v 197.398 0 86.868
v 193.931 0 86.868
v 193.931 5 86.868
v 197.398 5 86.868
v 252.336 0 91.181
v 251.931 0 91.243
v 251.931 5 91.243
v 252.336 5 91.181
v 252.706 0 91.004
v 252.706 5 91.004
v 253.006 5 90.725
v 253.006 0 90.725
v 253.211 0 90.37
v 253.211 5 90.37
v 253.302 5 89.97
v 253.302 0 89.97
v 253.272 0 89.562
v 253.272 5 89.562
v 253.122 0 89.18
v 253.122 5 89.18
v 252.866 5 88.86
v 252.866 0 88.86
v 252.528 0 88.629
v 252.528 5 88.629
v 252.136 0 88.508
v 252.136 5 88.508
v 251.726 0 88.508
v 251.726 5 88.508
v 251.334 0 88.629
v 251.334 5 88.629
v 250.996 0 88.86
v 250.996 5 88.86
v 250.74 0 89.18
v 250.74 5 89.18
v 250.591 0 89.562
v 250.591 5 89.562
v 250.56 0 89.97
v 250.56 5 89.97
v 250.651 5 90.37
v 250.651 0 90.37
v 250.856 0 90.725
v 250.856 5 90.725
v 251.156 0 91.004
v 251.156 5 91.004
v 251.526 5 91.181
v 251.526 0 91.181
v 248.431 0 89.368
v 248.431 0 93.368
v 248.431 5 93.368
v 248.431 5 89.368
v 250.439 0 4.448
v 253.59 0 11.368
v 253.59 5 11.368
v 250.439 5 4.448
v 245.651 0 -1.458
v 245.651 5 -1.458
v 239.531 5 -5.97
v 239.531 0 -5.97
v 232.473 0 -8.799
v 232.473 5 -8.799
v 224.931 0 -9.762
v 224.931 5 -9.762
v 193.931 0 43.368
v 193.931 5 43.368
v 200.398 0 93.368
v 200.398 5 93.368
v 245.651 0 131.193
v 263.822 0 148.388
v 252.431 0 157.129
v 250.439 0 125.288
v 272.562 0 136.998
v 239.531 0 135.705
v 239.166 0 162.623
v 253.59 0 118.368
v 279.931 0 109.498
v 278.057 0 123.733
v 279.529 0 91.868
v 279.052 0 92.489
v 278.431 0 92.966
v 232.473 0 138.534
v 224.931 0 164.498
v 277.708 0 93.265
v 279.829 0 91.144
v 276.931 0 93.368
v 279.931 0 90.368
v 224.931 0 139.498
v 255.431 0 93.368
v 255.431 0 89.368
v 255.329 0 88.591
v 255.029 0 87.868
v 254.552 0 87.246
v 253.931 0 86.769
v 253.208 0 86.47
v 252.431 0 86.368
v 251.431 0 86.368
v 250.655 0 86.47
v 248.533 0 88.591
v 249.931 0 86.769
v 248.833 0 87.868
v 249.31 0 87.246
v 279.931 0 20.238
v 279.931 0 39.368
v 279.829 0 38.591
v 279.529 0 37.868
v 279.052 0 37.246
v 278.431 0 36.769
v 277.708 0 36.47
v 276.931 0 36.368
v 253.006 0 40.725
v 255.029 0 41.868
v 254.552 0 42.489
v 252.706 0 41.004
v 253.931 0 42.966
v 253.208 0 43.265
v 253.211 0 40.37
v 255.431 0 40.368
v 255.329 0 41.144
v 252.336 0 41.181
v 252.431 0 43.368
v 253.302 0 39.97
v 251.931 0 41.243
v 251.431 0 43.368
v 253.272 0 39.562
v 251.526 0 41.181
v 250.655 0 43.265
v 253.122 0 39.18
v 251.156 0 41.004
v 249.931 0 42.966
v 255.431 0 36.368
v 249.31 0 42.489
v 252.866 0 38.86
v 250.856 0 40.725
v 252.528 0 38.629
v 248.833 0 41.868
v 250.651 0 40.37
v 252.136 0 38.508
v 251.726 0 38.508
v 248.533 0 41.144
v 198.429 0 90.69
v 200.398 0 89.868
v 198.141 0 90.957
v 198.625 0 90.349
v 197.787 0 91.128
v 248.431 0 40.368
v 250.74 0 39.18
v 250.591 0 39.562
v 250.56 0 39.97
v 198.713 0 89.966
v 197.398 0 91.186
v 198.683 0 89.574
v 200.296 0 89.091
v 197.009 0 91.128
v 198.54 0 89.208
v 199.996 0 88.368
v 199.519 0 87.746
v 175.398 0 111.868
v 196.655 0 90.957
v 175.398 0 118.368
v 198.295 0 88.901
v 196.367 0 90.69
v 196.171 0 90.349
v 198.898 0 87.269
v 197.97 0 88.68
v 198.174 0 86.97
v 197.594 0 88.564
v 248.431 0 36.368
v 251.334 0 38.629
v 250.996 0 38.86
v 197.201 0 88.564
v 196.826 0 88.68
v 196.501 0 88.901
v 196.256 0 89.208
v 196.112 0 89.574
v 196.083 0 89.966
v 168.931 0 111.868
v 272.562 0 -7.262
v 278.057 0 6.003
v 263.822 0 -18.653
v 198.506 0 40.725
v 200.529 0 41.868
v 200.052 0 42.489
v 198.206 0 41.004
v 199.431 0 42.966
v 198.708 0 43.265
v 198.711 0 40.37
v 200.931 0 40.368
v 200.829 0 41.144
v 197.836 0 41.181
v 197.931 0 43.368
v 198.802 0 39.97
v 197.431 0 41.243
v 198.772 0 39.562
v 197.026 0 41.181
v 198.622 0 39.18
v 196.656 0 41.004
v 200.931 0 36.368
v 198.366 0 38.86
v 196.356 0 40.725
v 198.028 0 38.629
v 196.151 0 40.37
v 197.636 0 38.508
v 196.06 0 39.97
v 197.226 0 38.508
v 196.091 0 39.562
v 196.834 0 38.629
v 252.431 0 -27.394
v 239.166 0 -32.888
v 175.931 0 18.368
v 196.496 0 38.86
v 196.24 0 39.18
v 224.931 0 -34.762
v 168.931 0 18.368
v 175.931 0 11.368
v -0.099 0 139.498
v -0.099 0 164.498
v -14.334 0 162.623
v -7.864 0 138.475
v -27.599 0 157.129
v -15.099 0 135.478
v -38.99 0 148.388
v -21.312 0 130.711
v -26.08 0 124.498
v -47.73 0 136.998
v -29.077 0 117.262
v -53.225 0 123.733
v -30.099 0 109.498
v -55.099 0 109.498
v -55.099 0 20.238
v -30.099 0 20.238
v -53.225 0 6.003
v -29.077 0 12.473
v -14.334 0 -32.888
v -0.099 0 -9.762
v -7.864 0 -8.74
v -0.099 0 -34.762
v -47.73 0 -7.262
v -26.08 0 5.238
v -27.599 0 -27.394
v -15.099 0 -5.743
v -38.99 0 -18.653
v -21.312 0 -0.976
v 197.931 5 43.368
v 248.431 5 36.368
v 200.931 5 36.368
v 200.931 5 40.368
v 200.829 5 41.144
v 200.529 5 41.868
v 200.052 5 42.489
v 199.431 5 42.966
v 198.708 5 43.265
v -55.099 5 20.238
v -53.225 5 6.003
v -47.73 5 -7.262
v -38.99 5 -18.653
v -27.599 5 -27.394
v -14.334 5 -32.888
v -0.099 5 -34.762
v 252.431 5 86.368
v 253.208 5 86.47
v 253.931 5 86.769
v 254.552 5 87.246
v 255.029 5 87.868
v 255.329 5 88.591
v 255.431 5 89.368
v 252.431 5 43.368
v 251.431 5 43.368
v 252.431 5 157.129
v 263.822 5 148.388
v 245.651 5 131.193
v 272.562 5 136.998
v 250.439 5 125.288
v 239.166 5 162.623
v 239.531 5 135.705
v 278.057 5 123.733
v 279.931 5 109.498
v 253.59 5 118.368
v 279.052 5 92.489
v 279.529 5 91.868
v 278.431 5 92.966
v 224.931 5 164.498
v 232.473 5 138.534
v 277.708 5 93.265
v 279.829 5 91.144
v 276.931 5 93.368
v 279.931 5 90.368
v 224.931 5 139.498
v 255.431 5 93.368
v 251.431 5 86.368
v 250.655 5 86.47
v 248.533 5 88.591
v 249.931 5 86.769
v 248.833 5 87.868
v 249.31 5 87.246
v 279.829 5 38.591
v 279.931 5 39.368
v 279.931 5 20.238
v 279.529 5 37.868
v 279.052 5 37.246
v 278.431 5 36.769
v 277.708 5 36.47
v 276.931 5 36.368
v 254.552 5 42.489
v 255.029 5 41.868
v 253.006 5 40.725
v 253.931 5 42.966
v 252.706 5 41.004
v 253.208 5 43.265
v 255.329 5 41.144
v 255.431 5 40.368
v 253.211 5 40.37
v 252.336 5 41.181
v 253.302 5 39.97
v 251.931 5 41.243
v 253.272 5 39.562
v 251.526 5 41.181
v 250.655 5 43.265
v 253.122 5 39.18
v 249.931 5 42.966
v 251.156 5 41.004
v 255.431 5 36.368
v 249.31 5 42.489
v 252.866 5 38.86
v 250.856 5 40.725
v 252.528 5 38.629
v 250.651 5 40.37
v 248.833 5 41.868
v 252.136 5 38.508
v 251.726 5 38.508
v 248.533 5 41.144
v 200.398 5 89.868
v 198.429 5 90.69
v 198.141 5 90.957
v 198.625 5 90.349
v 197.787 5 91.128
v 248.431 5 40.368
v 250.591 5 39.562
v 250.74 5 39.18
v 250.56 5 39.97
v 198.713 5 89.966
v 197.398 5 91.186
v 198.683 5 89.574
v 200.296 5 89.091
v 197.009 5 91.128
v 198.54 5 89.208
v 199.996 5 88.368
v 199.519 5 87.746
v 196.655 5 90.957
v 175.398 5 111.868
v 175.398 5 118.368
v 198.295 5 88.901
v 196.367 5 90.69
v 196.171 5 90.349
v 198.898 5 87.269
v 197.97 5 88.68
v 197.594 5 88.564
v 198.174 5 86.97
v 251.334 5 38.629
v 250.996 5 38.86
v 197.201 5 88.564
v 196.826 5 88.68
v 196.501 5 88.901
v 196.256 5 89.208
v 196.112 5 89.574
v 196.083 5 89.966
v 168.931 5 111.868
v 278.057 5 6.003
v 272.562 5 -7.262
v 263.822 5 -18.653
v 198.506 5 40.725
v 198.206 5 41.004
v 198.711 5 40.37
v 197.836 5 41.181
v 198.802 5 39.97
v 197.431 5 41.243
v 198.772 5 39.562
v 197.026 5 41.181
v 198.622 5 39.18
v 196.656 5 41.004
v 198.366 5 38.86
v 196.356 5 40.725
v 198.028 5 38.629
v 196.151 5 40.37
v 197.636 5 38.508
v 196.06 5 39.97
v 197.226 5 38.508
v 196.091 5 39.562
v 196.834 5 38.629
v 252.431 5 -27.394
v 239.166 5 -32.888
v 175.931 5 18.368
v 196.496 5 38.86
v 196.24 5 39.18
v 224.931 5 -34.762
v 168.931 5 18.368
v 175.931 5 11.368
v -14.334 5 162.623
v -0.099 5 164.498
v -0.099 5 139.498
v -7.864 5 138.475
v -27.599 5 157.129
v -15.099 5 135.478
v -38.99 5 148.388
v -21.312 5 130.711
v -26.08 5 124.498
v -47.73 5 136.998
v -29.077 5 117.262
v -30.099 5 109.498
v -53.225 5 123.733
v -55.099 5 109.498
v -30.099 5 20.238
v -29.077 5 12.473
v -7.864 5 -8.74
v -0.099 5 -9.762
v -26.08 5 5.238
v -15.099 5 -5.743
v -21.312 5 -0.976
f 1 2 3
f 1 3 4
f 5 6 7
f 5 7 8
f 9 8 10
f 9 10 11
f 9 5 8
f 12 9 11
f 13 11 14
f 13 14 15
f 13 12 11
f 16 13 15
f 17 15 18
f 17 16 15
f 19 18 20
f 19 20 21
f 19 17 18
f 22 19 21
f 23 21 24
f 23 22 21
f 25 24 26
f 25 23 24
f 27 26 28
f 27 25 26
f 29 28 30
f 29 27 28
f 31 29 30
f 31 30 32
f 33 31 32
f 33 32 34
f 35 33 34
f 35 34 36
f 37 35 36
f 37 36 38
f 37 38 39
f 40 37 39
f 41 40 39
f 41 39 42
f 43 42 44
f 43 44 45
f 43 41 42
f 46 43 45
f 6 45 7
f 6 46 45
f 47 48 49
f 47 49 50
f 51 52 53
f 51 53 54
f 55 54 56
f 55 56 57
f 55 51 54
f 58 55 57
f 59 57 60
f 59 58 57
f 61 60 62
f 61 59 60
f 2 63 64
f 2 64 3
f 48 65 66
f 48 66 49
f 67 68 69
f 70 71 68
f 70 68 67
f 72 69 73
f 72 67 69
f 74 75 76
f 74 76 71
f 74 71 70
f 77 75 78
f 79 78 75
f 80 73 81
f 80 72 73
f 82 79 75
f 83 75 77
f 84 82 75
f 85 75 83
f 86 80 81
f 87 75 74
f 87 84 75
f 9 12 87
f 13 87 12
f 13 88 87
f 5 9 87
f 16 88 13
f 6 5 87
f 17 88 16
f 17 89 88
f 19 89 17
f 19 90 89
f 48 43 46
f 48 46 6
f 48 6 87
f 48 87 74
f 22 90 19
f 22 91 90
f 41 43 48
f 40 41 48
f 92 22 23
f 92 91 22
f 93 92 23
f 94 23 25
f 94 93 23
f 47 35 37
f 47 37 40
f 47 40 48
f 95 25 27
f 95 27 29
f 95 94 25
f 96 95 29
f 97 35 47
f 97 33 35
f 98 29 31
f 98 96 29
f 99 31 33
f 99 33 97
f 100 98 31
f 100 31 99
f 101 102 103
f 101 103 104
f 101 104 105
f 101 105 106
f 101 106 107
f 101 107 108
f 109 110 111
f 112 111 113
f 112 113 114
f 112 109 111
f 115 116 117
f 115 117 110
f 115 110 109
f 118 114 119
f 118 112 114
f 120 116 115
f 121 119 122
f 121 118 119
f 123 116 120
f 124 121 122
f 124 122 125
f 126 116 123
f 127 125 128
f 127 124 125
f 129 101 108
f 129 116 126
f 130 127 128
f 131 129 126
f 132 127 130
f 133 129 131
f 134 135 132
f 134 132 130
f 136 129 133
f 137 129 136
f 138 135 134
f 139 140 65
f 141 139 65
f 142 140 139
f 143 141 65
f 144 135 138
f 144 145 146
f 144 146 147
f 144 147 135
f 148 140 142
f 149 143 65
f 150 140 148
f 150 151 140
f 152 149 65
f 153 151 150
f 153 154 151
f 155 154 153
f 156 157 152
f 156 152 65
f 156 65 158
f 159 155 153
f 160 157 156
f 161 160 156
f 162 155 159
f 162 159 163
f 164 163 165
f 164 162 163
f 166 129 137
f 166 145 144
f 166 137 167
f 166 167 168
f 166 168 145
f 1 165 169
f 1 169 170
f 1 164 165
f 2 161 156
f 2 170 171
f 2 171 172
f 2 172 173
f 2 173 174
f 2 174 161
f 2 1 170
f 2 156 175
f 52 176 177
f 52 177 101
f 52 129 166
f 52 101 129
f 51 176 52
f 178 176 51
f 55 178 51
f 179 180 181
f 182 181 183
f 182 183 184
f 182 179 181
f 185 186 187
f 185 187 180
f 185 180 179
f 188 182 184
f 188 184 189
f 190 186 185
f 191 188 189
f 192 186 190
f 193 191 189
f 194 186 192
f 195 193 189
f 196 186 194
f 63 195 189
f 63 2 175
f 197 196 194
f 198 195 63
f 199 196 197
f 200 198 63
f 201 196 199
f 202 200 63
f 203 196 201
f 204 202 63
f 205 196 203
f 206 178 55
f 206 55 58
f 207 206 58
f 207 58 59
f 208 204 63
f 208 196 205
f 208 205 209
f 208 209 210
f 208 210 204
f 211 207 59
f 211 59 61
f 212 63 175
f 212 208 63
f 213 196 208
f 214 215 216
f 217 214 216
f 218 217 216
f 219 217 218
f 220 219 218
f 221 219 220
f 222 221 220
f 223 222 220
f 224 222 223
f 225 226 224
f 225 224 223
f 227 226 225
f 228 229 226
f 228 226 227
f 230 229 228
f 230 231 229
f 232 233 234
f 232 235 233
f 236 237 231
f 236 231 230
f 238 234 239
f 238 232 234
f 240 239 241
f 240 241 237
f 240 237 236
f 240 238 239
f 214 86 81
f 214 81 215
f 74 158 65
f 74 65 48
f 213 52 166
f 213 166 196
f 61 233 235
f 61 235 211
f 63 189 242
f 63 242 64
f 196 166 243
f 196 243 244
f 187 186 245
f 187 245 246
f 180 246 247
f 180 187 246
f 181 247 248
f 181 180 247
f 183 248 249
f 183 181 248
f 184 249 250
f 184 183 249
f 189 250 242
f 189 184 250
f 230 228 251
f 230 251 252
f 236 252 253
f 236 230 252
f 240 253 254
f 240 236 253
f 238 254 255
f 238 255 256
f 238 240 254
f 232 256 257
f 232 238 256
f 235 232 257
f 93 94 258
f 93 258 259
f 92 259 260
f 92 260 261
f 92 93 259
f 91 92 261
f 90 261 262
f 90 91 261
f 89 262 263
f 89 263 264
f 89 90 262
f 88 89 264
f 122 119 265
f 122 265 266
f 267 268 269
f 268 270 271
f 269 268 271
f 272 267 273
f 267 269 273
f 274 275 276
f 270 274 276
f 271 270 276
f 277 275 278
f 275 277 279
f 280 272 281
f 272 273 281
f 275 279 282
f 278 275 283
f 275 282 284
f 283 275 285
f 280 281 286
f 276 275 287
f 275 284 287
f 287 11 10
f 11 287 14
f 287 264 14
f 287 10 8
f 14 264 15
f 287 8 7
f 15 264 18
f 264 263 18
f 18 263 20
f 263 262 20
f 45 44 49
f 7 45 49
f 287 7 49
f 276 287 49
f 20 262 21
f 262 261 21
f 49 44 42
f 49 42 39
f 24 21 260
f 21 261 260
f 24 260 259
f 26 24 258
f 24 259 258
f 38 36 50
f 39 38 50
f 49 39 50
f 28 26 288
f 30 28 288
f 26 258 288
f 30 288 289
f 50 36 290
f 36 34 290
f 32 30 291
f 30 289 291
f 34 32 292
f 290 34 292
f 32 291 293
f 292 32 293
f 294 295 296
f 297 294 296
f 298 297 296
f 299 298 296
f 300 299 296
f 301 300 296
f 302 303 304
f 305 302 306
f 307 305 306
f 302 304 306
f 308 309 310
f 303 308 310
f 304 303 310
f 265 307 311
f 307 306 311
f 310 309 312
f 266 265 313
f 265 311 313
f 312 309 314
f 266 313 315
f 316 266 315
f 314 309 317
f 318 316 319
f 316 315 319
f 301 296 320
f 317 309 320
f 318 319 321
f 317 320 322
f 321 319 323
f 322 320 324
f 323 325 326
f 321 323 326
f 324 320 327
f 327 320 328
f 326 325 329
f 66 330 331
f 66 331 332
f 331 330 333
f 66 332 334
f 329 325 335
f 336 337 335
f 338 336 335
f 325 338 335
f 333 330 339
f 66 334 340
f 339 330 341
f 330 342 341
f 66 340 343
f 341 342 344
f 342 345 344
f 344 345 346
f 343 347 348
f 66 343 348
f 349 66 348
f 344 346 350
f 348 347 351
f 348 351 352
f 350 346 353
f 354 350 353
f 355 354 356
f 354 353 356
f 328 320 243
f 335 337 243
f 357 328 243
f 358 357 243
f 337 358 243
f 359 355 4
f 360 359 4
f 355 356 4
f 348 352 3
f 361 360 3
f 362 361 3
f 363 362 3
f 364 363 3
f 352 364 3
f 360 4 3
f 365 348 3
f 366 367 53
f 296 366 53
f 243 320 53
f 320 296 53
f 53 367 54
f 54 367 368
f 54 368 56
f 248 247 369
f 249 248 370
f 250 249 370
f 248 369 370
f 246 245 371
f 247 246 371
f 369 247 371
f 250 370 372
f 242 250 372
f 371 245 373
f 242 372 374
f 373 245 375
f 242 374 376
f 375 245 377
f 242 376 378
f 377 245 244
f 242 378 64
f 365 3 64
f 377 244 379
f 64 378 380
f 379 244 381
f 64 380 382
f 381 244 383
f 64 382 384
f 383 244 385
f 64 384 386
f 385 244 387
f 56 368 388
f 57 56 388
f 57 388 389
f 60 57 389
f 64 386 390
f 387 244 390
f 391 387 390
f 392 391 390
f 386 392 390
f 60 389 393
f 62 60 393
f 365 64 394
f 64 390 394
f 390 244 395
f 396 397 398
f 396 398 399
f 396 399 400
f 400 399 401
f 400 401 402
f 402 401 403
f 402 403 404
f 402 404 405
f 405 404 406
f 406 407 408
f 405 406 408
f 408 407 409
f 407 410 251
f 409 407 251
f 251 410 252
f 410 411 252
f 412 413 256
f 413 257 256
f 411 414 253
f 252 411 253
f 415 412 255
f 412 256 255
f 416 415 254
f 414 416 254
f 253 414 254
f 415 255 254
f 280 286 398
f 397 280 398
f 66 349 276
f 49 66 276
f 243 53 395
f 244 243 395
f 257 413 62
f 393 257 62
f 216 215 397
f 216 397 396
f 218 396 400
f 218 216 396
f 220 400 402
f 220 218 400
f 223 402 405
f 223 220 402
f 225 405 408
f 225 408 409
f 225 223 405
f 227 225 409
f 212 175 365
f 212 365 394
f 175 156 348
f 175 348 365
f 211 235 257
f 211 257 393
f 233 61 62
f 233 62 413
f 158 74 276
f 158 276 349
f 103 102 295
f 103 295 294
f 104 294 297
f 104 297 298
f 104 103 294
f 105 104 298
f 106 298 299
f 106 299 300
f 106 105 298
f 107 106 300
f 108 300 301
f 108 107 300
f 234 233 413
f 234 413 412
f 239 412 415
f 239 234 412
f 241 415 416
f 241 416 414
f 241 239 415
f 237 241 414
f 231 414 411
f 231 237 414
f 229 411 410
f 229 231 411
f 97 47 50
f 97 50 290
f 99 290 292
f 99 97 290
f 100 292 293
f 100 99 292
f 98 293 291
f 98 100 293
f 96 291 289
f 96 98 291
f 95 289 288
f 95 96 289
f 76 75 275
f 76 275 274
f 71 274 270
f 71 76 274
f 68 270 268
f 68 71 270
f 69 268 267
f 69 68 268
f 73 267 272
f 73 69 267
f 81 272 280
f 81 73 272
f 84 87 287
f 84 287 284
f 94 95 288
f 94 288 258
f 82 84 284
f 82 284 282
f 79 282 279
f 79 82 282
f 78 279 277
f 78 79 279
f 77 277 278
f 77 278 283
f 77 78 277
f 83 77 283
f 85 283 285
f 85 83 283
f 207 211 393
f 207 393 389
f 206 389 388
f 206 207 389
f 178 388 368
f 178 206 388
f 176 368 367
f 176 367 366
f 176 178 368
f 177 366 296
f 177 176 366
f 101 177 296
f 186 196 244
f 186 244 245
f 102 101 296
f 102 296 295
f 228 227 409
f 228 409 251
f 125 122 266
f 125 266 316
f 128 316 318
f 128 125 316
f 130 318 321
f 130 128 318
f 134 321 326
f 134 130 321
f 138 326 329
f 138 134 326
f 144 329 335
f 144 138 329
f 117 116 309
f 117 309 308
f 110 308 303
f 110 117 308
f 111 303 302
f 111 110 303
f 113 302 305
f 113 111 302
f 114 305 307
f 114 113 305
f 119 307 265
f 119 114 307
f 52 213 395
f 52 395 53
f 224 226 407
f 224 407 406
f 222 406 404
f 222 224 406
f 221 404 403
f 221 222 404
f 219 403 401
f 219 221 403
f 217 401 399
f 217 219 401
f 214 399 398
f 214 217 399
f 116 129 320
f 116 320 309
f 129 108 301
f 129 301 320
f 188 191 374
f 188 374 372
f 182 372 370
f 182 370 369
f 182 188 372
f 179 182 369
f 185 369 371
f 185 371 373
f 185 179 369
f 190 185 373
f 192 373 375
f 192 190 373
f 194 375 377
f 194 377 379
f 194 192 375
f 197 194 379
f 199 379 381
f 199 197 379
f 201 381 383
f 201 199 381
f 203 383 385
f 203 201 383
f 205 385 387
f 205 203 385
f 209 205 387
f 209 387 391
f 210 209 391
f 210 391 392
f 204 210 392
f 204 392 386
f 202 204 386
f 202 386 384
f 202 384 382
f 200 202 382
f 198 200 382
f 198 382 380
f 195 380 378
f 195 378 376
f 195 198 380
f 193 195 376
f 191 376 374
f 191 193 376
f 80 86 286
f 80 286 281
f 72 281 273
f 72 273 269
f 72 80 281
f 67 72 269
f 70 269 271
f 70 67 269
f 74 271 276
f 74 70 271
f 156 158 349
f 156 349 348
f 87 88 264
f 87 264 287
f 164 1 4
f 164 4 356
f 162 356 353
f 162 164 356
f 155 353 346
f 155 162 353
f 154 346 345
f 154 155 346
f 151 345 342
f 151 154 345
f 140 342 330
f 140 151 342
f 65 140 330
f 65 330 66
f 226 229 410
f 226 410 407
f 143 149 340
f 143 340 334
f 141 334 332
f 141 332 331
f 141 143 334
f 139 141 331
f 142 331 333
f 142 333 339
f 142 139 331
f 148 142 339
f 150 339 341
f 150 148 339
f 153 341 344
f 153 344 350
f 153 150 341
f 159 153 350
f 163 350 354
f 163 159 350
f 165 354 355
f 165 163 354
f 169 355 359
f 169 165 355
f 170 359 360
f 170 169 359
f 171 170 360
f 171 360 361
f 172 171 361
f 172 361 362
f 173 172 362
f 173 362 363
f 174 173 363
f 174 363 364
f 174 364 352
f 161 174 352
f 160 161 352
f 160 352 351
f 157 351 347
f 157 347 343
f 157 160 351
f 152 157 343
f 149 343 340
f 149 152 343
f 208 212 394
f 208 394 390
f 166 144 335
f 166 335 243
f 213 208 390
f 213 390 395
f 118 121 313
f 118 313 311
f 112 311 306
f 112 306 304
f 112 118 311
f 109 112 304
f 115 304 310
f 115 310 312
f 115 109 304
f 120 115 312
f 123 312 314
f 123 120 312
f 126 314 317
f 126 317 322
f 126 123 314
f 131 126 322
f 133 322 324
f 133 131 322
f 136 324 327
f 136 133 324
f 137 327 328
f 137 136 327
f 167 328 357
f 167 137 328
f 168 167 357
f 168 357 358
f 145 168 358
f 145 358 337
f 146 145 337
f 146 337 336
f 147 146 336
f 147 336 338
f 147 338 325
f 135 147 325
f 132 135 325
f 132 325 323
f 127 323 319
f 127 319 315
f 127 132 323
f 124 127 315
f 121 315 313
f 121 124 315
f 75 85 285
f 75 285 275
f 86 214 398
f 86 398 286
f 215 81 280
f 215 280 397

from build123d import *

# Parameters (mm, degrees)
SKETCH1_R           = 1.375
SKETCH1_R_2         = 1.318565094
BOSS_EXTRUDE1_DEPTH = 5


with BuildPart() as part:
    # Sketch1 → Boss-Extrude1 (new body)
    with BuildSketch(Plane(origin=(0, 0, 0), x_dir=(1, 0, 0), z_dir=(0, 1, 0))):
        with BuildLine():
            Line((279.931043908, -90.367567702), (279.931043908, -109.497567702))
            ThreePointArc((279.931043908, -109.497567702), (263.821916873, -148.388440667), (224.931043908, -164.497567702))
            Line((224.931043908, -164.497567702), (-0.098956092, -164.497567702))
            ThreePointArc((-0.098956092, -164.497567702), (-38.989829057, -148.388440667), (-55.098956092, -109.497567702))
            Line((-55.098956092, -109.497567702), (-55.098956092, -20.237567702))
            ThreePointArc((-55.098956092, -20.237567702), (-38.989829057, 18.653305263), (-0.098956092, 34.762432298))
            Line((-0.098956092, 34.762432298), (224.931043908, 34.762432298))
            ThreePointArc((224.931043908, 34.762432298), (263.821916873, 18.653305263), (279.931043908, -20.237567702))
            Line((279.931043908, -20.237567702), (279.931043908, -39.367567702))
            ThreePointArc((279.931043908, -39.367567702), (279.052364252, -37.246247359), (276.931043908, -36.367567702))
            Line((276.931043908, -36.367567702), (255.431043908, -36.367567702))
            Line((255.431043908, -36.367567702), (255.431043908, -40.367567702))
            ThreePointArc((255.431043908, -40.367567702), (254.552364252, -42.488888046), (252.431043908, -43.367567702))
            Line((252.431043908, -43.367567702), (251.431043908, -43.367567702))
            ThreePointArc((251.431043908, -43.367567702), (249.309723565, -42.488888046), (248.431043908, -40.367567702))
            Line((248.431043908, -40.367567702), (248.431043908, -36.367567702))
            Line((248.431043908, -36.367567702), (200.931043908, -36.367567702))
            Line((200.931043908, -36.367567702), (200.931043908, -40.367567702))
            ThreePointArc((200.931043908, -40.367567702), (200.052364252, -42.488888046), (197.931043908, -43.367567702))
            Line((197.931043908, -43.367567702), (193.931043908, -43.367567702))
            Line((193.931043908, -43.367567702), (193.931043908, -86.867567702))
            Line((193.931043908, -86.867567702), (197.397932751, -86.867567702))
            ThreePointArc((197.397932751, -86.867567702), (199.519253094, -87.746247359), (200.397932751, -89.867567702))
            Line((200.397932751, -89.867567702), (200.397932751, -93.367567702))
            Line((200.397932751, -93.367567702), (248.431043908, -93.367567702))
            Line((248.431043908, -93.367567702), (248.431043908, -89.367567702))
            ThreePointArc((248.431043908, -89.367567702), (249.309723565, -87.246247359), (251.431043908, -86.367567702))
            Line((251.431043908, -86.367567702), (252.431043908, -86.367567702))
            ThreePointArc((252.431043908, -86.367567702), (254.552364252, -87.246247359), (255.431043908, -89.367567702))
            Line((255.431043908, -89.367567702), (255.431043908, -93.367567702))
            Line((255.431043908, -93.367567702), (276.931043908, -93.367567702))
            ThreePointArc((276.931043908, -93.367567702), (279.052364252, -92.488888046), (279.931043908, -90.367567702))
        make_face()
        with Locations(Location((251.931043908, -39.867567702, 0), (0, 0, 270))):
            Circle(SKETCH1_R, mode=Mode.SUBTRACT)
        with Locations(Location((251.931043908, -89.867567702, 0), (0, 0, 270))):
            Circle(SKETCH1_R, mode=Mode.SUBTRACT)
        with Locations(Location((197.397932751, -89.867567702, 0), (0, 0, 270))):
            Circle(SKETCH1_R_2, mode=Mode.SUBTRACT)
        with Locations(Location((197.431043908, -39.867567702, 0), (0, 0, 270))):
            Circle(SKETCH1_R, mode=Mode.SUBTRACT)
        with BuildLine():
            Line((-0.098956092, -139.497567702), (224.931043908, -139.497567702))
            ThreePointArc((224.931043908, -139.497567702), (242.734133528, -133.643996009), (253.589779051, -118.367567702))
            Line((253.589779051, -118.367567702), (251.931043908, -118.367567702))
            Line((251.931043908, -118.367567702), (175.397932751, -118.367567702))
            Line((175.397932751, -118.367567702), (175.397932751, -111.867567702))
            Line((175.397932751, -111.867567702), (168.931043908, -111.867567702))
            Line((168.931043908, -111.867567702), (168.931043908, -18.367567702))
            Line((168.931043908, -18.367567702), (175.931043908, -18.367567702))
            Line((175.931043908, -18.367567702), (175.931043908, -11.367567702))
            Line((175.931043908, -11.367567702), (251.931043908, -11.367567702))
            Line((251.931043908, -11.367567702), (253.589779051, -11.367567702))
            ThreePointArc((253.589779051, -11.367567702), (242.734133528, 3.908860605), (224.931043908, 9.762432298))
            Line((224.931043908, 9.762432298), (-0.098956092, 9.762432298))
            ThreePointArc((-0.098956092, 9.762432298), (-21.312159527, 0.975635734), (-30.098956092, -20.237567702))
            Line((-30.098956092, -20.237567702), (-30.098956092, -109.497567702))
            ThreePointArc((-30.098956092, -109.497567702), (-21.312159527, -130.710771138), (-0.098956092, -139.497567702))
        make_face(mode=Mode.SUBTRACT)
    extrude(amount=BOSS_EXTRUDE1_DEPTH)


solid = part.part
